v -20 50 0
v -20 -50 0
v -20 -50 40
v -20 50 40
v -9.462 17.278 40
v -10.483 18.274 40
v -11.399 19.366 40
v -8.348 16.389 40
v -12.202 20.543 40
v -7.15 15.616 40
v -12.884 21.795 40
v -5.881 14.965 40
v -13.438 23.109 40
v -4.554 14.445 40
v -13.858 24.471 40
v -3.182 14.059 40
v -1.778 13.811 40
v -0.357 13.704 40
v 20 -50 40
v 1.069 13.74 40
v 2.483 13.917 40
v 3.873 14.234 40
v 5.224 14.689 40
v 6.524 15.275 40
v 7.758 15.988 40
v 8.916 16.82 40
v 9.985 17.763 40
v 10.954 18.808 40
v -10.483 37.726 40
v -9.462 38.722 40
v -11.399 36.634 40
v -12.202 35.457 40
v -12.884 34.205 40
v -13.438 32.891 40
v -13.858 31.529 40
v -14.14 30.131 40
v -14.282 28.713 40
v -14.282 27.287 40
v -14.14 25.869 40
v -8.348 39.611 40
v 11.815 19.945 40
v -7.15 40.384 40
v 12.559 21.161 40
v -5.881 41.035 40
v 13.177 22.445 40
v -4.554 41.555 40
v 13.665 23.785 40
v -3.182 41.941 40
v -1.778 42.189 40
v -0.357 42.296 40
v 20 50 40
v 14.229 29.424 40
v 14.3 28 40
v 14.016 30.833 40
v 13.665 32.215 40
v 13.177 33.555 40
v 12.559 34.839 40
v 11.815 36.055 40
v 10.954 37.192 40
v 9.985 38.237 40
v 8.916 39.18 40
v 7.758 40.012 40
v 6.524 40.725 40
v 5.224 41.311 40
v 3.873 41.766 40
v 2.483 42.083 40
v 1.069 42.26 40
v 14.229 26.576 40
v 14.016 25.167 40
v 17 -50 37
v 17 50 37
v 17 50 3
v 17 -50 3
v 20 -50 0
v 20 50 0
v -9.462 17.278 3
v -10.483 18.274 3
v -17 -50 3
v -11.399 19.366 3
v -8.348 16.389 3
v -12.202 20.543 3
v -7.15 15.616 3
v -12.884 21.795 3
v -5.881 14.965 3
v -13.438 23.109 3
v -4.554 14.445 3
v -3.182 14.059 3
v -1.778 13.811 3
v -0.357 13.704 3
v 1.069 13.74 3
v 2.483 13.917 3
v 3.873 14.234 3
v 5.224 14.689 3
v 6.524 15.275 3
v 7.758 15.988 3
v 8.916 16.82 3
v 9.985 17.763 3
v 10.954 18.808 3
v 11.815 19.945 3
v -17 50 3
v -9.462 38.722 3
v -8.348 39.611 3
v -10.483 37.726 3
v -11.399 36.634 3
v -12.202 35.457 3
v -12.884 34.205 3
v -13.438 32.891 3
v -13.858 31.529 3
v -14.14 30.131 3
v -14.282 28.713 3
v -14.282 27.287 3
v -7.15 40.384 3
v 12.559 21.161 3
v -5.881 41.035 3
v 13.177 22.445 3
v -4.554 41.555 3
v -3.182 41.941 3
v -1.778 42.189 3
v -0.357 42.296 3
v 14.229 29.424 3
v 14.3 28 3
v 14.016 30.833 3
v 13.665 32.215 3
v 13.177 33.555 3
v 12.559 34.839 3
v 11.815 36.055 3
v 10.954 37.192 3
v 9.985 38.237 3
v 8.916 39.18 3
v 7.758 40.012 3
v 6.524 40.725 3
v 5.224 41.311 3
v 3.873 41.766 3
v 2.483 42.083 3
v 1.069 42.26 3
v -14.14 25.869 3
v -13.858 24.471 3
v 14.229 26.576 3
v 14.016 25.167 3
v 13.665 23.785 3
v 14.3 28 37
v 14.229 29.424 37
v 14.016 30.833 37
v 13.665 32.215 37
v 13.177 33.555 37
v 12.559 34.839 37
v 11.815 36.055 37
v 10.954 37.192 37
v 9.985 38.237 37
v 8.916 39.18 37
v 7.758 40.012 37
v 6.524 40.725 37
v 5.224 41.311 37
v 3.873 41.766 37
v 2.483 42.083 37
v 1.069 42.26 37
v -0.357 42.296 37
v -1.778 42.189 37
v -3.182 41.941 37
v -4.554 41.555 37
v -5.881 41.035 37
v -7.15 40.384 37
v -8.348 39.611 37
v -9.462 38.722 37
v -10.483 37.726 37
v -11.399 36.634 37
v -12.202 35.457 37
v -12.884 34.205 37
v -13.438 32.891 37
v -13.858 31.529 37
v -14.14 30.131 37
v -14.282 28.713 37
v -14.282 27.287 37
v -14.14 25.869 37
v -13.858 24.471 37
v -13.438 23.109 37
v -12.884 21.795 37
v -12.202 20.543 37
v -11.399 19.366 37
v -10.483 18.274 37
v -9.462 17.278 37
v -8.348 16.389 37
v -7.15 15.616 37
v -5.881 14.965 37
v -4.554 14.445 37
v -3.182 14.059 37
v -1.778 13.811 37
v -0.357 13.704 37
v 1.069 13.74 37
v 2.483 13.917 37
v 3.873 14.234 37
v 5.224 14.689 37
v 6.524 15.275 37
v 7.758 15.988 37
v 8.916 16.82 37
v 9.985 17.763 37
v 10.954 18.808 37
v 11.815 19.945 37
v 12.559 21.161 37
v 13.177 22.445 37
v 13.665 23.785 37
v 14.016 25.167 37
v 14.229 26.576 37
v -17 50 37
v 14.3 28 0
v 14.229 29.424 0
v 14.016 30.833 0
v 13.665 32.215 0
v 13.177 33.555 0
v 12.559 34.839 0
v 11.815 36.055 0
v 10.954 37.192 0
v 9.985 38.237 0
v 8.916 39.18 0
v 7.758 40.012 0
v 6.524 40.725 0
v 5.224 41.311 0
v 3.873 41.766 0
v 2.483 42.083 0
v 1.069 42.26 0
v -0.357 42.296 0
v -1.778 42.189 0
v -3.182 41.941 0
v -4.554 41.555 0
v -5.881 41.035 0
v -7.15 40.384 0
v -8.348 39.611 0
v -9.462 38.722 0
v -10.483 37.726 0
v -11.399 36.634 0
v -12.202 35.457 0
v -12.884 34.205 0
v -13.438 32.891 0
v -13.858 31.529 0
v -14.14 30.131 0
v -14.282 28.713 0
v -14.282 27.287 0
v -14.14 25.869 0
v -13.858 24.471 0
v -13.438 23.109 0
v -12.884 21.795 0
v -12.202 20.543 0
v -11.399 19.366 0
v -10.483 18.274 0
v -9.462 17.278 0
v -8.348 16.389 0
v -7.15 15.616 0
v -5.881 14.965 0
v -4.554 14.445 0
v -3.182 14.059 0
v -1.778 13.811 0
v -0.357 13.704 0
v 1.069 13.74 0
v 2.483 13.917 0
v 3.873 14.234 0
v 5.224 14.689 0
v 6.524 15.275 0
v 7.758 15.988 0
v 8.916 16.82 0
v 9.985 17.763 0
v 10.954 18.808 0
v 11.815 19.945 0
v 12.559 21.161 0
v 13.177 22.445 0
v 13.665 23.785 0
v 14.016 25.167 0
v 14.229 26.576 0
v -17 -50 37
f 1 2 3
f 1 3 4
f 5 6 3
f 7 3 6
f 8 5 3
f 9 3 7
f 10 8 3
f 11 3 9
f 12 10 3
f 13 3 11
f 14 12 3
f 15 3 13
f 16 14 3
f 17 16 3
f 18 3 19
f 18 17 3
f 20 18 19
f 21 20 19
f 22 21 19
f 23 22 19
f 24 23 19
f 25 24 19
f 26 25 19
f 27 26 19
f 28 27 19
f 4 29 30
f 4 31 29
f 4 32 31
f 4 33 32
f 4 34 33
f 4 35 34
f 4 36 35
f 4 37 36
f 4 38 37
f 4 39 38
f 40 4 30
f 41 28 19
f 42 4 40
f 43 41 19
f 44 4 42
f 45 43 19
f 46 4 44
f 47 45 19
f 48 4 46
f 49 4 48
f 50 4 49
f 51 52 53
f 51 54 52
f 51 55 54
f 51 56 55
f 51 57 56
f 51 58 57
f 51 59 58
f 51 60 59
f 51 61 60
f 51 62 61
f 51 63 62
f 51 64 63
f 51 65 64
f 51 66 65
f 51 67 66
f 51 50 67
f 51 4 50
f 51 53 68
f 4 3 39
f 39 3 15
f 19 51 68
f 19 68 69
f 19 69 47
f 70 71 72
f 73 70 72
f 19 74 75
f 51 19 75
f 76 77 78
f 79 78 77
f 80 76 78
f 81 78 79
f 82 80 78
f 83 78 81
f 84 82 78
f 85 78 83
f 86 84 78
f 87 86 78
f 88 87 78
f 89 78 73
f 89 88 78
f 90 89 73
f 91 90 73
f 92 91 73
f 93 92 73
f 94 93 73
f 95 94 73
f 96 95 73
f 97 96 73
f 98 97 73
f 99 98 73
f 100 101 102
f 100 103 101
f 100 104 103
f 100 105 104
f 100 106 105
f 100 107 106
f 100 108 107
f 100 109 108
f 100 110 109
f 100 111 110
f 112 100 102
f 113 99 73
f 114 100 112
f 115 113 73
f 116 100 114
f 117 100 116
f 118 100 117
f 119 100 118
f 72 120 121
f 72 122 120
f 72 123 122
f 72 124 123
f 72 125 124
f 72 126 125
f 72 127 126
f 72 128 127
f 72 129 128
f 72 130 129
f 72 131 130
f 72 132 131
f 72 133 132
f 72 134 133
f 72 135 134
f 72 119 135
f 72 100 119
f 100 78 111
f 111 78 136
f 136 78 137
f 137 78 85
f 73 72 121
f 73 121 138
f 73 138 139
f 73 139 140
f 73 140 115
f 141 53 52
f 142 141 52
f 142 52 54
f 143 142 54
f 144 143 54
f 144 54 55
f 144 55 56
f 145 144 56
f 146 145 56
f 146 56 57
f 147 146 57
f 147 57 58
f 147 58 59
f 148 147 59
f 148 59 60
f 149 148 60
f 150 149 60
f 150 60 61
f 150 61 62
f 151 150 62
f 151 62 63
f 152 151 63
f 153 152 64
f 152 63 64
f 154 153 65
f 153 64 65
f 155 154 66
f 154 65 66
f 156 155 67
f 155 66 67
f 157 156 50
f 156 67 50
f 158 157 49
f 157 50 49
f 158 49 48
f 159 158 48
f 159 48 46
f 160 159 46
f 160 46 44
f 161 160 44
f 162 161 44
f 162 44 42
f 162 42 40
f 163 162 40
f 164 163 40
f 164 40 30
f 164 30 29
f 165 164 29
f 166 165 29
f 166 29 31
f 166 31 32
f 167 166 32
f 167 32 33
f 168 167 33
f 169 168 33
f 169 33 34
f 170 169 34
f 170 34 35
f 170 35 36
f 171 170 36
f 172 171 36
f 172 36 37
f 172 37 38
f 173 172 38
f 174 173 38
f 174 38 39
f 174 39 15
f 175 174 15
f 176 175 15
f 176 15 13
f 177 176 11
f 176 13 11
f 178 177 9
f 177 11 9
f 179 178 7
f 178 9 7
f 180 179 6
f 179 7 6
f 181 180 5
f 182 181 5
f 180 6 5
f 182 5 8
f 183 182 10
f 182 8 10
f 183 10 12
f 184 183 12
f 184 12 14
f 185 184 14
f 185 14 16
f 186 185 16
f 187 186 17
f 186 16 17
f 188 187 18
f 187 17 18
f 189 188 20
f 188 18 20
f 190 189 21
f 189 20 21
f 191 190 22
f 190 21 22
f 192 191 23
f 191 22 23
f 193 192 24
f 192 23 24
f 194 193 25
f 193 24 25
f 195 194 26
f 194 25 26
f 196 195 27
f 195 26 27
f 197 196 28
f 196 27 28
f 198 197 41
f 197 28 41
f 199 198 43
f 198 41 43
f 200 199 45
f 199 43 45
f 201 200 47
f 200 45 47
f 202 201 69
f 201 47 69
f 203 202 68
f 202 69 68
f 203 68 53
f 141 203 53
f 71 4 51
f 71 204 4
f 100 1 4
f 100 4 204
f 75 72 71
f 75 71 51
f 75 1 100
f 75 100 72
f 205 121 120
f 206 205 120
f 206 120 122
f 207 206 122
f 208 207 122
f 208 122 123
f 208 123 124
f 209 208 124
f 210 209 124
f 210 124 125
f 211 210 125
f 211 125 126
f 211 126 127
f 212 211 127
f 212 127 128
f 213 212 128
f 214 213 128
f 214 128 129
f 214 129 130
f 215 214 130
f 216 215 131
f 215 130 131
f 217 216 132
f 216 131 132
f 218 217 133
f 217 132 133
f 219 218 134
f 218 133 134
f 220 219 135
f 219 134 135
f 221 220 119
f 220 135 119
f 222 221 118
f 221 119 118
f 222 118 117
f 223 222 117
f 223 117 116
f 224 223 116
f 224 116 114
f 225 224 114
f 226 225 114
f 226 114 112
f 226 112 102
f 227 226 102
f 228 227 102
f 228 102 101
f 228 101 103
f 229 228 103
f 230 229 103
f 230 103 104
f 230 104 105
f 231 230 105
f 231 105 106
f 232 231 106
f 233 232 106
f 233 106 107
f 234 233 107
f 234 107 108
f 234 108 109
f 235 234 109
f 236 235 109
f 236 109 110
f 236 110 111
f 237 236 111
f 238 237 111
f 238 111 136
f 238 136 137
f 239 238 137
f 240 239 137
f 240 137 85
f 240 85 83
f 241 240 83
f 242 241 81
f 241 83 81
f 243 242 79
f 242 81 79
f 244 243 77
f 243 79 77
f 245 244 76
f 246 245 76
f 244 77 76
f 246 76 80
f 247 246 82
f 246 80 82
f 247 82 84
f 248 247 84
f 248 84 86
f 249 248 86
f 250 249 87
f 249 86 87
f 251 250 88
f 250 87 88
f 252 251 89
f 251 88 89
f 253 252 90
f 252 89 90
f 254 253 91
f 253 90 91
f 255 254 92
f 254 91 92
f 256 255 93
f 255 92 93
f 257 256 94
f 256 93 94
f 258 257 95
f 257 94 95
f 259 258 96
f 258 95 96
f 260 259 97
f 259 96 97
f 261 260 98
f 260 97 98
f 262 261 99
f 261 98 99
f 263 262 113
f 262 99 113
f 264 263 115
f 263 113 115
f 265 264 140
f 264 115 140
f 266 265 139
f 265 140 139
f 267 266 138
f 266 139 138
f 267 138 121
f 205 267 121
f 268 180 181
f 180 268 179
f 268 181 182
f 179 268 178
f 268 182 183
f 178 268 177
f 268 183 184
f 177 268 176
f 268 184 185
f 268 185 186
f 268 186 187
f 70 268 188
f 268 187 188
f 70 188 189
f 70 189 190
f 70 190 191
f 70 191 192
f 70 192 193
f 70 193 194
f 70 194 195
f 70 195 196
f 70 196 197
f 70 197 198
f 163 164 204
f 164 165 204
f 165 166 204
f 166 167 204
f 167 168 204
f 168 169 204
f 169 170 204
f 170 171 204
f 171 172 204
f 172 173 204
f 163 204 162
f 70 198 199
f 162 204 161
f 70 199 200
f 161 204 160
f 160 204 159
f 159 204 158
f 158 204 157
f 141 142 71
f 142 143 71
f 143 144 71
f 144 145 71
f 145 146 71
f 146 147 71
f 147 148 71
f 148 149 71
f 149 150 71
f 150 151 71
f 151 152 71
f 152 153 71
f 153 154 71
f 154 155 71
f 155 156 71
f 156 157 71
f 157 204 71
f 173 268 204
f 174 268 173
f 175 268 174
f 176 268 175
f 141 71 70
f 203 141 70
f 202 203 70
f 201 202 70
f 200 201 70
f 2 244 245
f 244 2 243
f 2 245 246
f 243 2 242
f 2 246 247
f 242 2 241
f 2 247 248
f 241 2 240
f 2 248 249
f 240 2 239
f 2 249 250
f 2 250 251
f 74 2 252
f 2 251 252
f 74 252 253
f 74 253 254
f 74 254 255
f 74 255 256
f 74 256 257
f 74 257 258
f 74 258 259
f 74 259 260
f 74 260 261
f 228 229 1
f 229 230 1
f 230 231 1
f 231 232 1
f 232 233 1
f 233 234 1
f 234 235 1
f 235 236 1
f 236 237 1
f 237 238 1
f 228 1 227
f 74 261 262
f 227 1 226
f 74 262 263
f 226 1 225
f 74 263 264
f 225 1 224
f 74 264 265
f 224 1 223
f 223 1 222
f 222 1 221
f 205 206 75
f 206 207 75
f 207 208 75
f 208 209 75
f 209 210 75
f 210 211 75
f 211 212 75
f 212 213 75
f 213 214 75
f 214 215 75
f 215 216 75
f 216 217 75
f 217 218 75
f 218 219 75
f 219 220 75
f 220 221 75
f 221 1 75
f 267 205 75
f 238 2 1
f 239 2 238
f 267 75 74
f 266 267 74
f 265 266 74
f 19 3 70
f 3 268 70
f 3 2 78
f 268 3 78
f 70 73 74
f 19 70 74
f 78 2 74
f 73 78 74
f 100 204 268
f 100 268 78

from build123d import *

# Parameters (mm, degrees)
SKETCH1_W           = 40
SKETCH1_H           = 100
BOSS_EXTRUDE2_DEPTH = 40
SKETCH2_R           = 14.3
CUT_EXTRUDE1_DEPTH  = 41
SKETCH3_W           = 34
SKETCH3_H           = 34
CUT_EXTRUDE2_DEPTH  = 101


with BuildPart() as part:
    # Sketch1 → Boss-Extrude2 (new body)
    with BuildSketch(Plane.XY):
        Rectangle(SKETCH1_W, SKETCH1_H)
    extrude(amount=BOSS_EXTRUDE2_DEPTH)

    # Sketch2 → Cut-Extrude1 (cut, through all)
    with BuildSketch(Plane.XY.offset(40)):
        with Locations((0, 28)):
            Circle(SKETCH2_R)
    extrude(amount=-CUT_EXTRUDE1_DEPTH, mode=Mode.SUBTRACT)

    # Sketch3 → Cut-Extrude2 (cut, through all)
    with BuildSketch(Plane(origin=(0, 50, 0), x_dir=(1, 0, 0), z_dir=(0, 1, 0))):
        with Locations((0, -20)):
            Rectangle(SKETCH3_W, SKETCH3_H)
    extrude(amount=-CUT_EXTRUDE2_DEPTH, mode=Mode.SUBTRACT)


solid = part.part
